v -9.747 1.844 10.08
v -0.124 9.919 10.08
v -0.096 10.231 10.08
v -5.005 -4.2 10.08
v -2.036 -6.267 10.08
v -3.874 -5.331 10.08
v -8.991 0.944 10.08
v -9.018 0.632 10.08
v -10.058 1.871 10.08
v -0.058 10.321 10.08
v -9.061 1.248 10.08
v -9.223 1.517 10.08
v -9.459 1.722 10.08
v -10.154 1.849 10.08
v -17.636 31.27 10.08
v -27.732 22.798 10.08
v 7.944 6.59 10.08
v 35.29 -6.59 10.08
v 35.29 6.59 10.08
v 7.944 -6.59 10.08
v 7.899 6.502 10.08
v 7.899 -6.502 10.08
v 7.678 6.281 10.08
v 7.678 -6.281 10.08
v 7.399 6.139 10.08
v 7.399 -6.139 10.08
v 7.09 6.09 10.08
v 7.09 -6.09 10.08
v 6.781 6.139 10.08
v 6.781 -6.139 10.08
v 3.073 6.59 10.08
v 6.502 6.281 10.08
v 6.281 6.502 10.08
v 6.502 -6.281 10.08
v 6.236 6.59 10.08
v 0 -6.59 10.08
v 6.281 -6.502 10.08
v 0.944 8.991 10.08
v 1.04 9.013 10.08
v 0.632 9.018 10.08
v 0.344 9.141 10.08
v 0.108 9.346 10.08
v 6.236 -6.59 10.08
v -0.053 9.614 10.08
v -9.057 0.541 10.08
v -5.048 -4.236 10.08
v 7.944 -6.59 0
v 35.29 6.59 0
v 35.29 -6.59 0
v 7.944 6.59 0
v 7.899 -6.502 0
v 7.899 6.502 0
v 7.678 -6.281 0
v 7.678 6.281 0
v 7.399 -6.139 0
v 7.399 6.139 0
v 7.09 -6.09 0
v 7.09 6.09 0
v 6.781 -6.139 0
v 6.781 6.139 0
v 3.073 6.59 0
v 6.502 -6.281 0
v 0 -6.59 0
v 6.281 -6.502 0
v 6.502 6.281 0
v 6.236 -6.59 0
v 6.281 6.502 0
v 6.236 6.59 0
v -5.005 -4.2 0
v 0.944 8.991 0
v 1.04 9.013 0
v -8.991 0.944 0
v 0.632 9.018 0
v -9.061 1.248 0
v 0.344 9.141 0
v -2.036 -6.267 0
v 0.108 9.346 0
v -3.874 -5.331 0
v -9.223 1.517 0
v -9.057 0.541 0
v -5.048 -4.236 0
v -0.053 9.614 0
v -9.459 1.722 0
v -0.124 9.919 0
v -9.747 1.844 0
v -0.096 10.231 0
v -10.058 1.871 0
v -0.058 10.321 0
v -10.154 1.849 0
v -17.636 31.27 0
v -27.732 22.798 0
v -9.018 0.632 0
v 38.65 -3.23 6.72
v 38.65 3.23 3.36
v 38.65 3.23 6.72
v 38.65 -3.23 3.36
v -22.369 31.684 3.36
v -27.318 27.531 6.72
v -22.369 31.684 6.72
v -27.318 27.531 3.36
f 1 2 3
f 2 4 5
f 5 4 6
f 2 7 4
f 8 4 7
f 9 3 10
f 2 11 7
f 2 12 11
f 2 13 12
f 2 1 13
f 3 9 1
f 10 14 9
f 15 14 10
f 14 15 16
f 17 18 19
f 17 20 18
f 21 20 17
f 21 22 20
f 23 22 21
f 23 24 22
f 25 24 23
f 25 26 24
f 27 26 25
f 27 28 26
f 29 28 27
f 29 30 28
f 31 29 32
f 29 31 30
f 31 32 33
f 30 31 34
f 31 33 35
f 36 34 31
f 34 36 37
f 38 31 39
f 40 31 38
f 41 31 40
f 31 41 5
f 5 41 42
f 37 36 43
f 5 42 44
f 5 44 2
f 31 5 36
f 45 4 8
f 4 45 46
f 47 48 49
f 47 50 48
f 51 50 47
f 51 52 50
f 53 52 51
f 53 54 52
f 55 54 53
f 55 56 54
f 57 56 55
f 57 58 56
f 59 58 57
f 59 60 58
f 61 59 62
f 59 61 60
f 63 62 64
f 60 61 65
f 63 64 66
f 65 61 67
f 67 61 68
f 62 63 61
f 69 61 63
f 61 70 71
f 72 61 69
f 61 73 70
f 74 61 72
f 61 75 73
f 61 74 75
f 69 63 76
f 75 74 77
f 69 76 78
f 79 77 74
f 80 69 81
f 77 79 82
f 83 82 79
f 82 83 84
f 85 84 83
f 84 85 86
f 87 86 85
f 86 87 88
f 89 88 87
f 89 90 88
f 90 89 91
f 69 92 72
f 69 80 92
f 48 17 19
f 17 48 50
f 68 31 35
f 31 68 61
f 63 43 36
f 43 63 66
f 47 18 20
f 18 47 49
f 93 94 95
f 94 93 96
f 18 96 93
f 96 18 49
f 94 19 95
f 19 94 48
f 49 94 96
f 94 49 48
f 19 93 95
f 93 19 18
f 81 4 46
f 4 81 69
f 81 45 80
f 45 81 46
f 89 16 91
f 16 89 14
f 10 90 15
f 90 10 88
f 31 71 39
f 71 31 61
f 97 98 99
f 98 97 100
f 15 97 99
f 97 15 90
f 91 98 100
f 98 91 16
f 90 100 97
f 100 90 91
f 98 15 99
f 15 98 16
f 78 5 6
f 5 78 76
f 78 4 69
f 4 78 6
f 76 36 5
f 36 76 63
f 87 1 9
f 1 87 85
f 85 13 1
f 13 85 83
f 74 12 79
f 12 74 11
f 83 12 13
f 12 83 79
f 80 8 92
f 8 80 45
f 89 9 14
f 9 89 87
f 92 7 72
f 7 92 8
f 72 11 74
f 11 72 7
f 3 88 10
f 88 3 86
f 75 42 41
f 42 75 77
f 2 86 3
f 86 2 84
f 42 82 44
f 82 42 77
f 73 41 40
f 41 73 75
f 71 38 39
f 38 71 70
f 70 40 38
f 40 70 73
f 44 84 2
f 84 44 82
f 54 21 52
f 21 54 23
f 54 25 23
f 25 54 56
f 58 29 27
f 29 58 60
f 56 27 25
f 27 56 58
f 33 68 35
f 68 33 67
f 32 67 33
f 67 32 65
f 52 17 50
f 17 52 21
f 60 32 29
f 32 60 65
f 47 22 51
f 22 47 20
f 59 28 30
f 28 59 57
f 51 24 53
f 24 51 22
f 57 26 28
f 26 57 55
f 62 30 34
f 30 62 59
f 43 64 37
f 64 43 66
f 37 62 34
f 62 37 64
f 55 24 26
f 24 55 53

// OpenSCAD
// This thing allows you to create corners, tees, crosses, 
// and splices for fixing up your window screens.
//
// This is licensed under the creative commons+attribution licence
// To fulfil the attribution requirement, please link to:
//		http://www.thingiverse.com/thing:897599

/* [Main] */

// what shape of screen connector
shape=0; // [0:corner,1:splice,2:tee,3:four way]

// the style of the screen connector
style=1; // [0:mitre,1:straight_end]

// how wide
width=13.18;

// measurement from the edge to the corner
depth_to_corner=25.47;

// how thick the part is
thickness=10.08;

// The angle of the joint (only works for corner)
angle=130;

/* [Advanced] */

// This makes it look nicer, but can make printablility more complex
outer_thickness=0;

/* [Hidden] */

module end(bevel,width,depth,thickness){
	translate([0,-width/2,0]) cube([depth-bevel,width,thickness]);
	translate([depth-bevel/2,0,thickness/2]) rotate([0,-90,0]) frustum(thickness,width,thickness-bevel*2,width-bevel*2,bevel);
}

module old_mitre_style(){
	outside_corner_r=width/6;
	inside_corner_r=width/18;
	bevel=thickness/3;
	translate([0,0,-thickness/2]) linear_extrude(thickness) {
		difference(){
			union(){
				translate([0,bevel-depth_to_corner,0]) square([width,depth_to_corner-bevel]);
				rotate([0,0,90]) square([width,depth_to_corner-bevel]);
				translate([width-outside_corner_r,width-outside_corner_r,0]) circle(r=outside_corner_r,$fn=20);
				square([width-outside_corner_r,width]);
				square([width,width-outside_corner_r]);
			}
			circle(r=inside_corner_r,$fn=20);
		}
	}
	translate([bevel/2-depth_to_corner,width/2,0]) rotate([0,90,0]) frustum(thickness,width,thickness-bevel*2,width-bevel*2,bevel);
	translate([width/2,bevel/2-depth_to_corner,0]) rotate([0,0,90]) rotate([0,90,0]) frustum(thickness,width,thickness-bevel*2,width-bevel*2,bevel);
}



module frustum(w,h,w2,h2,d){
	hull(){
		translate([-w/2,-h/2,d/2]) cube([w,h,0.01]);
		translate([-w2/2,-h2/2,-d/2]) cube([w2,h2,0.01]);
	}
}

module reliefs(angle,r=1,$fn=20){
	n=width/2+r/2;
	translate([ n, n,-1]) cylinder(r=r,h=thickness+2);
	translate([-n,-n,-1]) cylinder(r=r,h=thickness+2);
	translate([ n,-n,-1]) cylinder(r=r,h=thickness+2);
	rotate([0,0,angle]) {
		translate([ n, n,-1]) cylinder(r=r,h=thickness+2);
		//translate([-n,-n,-1]) cylinder(r=r,h=thickness+2);
		translate([ n,-n,-1]) cylinder(r=r,h=thickness+2);
	}
}

if (outer_thickness<=0){
	outer_thickness=thickness;
}

difference(){
	union(){
		if(shape==0){ //corner
			end(thickness/3,width,depth_to_corner+width,thickness,mitre=style==0);
			rotate([0,0,angle]) end(thickness/3,width,depth_to_corner+width,thickness);
			if(style==0||((angle%90)!=0)){
				cylinder(r=width/2,h=thickness,$fn=20);
			}else{
				translate([-width/2,-width/2,-outer_thickness]) cube([width,width,thickness+2*outer_thickness]);
			}
		}
		if(shape==1){ // straight (only miter style/no connector)
			end(thickness/3,width,depth_to_corner,thickness);
			rotate([0,0,180]) end(thickness/3,width,depth_to_corner,thickness);
		}
		if(shape==2){ // 3-way (always non-miter style)
			end(thickness/3,width,depth_to_corner+width,thickness);
			rotate([0,0,90]) end(thickness/3,width,depth_to_corner+width,thickness);
			rotate([0,0,180]) end(thickness/3,width,depth_to_corner+width,thickness);
			translate([-width/2,-width/2,-(outer_thickness-thickness)/2]) cube([width,width,outer_thickness]);
		}
		if(shape==3){ // 4-way (always non-miter style)
			end(thickness/3,width,depth_to_corner+width,thickness);
			rotate([0,0,90]) end(thickness/3,width,depth_to_corner+width,thickness);
			rotate([0,0,180]) end(thickness/3,width,depth_to_corner+width,thickness);
			rotate([0,0,-90]) end(thickness/3,width,depth_to_corner+width,thickness);
			translate([-width/2,-width/2,-(outer_thickness-thickness)/2]) cube([width,width,outer_thickness]);
		}
	}
	reliefs(angle);
}
